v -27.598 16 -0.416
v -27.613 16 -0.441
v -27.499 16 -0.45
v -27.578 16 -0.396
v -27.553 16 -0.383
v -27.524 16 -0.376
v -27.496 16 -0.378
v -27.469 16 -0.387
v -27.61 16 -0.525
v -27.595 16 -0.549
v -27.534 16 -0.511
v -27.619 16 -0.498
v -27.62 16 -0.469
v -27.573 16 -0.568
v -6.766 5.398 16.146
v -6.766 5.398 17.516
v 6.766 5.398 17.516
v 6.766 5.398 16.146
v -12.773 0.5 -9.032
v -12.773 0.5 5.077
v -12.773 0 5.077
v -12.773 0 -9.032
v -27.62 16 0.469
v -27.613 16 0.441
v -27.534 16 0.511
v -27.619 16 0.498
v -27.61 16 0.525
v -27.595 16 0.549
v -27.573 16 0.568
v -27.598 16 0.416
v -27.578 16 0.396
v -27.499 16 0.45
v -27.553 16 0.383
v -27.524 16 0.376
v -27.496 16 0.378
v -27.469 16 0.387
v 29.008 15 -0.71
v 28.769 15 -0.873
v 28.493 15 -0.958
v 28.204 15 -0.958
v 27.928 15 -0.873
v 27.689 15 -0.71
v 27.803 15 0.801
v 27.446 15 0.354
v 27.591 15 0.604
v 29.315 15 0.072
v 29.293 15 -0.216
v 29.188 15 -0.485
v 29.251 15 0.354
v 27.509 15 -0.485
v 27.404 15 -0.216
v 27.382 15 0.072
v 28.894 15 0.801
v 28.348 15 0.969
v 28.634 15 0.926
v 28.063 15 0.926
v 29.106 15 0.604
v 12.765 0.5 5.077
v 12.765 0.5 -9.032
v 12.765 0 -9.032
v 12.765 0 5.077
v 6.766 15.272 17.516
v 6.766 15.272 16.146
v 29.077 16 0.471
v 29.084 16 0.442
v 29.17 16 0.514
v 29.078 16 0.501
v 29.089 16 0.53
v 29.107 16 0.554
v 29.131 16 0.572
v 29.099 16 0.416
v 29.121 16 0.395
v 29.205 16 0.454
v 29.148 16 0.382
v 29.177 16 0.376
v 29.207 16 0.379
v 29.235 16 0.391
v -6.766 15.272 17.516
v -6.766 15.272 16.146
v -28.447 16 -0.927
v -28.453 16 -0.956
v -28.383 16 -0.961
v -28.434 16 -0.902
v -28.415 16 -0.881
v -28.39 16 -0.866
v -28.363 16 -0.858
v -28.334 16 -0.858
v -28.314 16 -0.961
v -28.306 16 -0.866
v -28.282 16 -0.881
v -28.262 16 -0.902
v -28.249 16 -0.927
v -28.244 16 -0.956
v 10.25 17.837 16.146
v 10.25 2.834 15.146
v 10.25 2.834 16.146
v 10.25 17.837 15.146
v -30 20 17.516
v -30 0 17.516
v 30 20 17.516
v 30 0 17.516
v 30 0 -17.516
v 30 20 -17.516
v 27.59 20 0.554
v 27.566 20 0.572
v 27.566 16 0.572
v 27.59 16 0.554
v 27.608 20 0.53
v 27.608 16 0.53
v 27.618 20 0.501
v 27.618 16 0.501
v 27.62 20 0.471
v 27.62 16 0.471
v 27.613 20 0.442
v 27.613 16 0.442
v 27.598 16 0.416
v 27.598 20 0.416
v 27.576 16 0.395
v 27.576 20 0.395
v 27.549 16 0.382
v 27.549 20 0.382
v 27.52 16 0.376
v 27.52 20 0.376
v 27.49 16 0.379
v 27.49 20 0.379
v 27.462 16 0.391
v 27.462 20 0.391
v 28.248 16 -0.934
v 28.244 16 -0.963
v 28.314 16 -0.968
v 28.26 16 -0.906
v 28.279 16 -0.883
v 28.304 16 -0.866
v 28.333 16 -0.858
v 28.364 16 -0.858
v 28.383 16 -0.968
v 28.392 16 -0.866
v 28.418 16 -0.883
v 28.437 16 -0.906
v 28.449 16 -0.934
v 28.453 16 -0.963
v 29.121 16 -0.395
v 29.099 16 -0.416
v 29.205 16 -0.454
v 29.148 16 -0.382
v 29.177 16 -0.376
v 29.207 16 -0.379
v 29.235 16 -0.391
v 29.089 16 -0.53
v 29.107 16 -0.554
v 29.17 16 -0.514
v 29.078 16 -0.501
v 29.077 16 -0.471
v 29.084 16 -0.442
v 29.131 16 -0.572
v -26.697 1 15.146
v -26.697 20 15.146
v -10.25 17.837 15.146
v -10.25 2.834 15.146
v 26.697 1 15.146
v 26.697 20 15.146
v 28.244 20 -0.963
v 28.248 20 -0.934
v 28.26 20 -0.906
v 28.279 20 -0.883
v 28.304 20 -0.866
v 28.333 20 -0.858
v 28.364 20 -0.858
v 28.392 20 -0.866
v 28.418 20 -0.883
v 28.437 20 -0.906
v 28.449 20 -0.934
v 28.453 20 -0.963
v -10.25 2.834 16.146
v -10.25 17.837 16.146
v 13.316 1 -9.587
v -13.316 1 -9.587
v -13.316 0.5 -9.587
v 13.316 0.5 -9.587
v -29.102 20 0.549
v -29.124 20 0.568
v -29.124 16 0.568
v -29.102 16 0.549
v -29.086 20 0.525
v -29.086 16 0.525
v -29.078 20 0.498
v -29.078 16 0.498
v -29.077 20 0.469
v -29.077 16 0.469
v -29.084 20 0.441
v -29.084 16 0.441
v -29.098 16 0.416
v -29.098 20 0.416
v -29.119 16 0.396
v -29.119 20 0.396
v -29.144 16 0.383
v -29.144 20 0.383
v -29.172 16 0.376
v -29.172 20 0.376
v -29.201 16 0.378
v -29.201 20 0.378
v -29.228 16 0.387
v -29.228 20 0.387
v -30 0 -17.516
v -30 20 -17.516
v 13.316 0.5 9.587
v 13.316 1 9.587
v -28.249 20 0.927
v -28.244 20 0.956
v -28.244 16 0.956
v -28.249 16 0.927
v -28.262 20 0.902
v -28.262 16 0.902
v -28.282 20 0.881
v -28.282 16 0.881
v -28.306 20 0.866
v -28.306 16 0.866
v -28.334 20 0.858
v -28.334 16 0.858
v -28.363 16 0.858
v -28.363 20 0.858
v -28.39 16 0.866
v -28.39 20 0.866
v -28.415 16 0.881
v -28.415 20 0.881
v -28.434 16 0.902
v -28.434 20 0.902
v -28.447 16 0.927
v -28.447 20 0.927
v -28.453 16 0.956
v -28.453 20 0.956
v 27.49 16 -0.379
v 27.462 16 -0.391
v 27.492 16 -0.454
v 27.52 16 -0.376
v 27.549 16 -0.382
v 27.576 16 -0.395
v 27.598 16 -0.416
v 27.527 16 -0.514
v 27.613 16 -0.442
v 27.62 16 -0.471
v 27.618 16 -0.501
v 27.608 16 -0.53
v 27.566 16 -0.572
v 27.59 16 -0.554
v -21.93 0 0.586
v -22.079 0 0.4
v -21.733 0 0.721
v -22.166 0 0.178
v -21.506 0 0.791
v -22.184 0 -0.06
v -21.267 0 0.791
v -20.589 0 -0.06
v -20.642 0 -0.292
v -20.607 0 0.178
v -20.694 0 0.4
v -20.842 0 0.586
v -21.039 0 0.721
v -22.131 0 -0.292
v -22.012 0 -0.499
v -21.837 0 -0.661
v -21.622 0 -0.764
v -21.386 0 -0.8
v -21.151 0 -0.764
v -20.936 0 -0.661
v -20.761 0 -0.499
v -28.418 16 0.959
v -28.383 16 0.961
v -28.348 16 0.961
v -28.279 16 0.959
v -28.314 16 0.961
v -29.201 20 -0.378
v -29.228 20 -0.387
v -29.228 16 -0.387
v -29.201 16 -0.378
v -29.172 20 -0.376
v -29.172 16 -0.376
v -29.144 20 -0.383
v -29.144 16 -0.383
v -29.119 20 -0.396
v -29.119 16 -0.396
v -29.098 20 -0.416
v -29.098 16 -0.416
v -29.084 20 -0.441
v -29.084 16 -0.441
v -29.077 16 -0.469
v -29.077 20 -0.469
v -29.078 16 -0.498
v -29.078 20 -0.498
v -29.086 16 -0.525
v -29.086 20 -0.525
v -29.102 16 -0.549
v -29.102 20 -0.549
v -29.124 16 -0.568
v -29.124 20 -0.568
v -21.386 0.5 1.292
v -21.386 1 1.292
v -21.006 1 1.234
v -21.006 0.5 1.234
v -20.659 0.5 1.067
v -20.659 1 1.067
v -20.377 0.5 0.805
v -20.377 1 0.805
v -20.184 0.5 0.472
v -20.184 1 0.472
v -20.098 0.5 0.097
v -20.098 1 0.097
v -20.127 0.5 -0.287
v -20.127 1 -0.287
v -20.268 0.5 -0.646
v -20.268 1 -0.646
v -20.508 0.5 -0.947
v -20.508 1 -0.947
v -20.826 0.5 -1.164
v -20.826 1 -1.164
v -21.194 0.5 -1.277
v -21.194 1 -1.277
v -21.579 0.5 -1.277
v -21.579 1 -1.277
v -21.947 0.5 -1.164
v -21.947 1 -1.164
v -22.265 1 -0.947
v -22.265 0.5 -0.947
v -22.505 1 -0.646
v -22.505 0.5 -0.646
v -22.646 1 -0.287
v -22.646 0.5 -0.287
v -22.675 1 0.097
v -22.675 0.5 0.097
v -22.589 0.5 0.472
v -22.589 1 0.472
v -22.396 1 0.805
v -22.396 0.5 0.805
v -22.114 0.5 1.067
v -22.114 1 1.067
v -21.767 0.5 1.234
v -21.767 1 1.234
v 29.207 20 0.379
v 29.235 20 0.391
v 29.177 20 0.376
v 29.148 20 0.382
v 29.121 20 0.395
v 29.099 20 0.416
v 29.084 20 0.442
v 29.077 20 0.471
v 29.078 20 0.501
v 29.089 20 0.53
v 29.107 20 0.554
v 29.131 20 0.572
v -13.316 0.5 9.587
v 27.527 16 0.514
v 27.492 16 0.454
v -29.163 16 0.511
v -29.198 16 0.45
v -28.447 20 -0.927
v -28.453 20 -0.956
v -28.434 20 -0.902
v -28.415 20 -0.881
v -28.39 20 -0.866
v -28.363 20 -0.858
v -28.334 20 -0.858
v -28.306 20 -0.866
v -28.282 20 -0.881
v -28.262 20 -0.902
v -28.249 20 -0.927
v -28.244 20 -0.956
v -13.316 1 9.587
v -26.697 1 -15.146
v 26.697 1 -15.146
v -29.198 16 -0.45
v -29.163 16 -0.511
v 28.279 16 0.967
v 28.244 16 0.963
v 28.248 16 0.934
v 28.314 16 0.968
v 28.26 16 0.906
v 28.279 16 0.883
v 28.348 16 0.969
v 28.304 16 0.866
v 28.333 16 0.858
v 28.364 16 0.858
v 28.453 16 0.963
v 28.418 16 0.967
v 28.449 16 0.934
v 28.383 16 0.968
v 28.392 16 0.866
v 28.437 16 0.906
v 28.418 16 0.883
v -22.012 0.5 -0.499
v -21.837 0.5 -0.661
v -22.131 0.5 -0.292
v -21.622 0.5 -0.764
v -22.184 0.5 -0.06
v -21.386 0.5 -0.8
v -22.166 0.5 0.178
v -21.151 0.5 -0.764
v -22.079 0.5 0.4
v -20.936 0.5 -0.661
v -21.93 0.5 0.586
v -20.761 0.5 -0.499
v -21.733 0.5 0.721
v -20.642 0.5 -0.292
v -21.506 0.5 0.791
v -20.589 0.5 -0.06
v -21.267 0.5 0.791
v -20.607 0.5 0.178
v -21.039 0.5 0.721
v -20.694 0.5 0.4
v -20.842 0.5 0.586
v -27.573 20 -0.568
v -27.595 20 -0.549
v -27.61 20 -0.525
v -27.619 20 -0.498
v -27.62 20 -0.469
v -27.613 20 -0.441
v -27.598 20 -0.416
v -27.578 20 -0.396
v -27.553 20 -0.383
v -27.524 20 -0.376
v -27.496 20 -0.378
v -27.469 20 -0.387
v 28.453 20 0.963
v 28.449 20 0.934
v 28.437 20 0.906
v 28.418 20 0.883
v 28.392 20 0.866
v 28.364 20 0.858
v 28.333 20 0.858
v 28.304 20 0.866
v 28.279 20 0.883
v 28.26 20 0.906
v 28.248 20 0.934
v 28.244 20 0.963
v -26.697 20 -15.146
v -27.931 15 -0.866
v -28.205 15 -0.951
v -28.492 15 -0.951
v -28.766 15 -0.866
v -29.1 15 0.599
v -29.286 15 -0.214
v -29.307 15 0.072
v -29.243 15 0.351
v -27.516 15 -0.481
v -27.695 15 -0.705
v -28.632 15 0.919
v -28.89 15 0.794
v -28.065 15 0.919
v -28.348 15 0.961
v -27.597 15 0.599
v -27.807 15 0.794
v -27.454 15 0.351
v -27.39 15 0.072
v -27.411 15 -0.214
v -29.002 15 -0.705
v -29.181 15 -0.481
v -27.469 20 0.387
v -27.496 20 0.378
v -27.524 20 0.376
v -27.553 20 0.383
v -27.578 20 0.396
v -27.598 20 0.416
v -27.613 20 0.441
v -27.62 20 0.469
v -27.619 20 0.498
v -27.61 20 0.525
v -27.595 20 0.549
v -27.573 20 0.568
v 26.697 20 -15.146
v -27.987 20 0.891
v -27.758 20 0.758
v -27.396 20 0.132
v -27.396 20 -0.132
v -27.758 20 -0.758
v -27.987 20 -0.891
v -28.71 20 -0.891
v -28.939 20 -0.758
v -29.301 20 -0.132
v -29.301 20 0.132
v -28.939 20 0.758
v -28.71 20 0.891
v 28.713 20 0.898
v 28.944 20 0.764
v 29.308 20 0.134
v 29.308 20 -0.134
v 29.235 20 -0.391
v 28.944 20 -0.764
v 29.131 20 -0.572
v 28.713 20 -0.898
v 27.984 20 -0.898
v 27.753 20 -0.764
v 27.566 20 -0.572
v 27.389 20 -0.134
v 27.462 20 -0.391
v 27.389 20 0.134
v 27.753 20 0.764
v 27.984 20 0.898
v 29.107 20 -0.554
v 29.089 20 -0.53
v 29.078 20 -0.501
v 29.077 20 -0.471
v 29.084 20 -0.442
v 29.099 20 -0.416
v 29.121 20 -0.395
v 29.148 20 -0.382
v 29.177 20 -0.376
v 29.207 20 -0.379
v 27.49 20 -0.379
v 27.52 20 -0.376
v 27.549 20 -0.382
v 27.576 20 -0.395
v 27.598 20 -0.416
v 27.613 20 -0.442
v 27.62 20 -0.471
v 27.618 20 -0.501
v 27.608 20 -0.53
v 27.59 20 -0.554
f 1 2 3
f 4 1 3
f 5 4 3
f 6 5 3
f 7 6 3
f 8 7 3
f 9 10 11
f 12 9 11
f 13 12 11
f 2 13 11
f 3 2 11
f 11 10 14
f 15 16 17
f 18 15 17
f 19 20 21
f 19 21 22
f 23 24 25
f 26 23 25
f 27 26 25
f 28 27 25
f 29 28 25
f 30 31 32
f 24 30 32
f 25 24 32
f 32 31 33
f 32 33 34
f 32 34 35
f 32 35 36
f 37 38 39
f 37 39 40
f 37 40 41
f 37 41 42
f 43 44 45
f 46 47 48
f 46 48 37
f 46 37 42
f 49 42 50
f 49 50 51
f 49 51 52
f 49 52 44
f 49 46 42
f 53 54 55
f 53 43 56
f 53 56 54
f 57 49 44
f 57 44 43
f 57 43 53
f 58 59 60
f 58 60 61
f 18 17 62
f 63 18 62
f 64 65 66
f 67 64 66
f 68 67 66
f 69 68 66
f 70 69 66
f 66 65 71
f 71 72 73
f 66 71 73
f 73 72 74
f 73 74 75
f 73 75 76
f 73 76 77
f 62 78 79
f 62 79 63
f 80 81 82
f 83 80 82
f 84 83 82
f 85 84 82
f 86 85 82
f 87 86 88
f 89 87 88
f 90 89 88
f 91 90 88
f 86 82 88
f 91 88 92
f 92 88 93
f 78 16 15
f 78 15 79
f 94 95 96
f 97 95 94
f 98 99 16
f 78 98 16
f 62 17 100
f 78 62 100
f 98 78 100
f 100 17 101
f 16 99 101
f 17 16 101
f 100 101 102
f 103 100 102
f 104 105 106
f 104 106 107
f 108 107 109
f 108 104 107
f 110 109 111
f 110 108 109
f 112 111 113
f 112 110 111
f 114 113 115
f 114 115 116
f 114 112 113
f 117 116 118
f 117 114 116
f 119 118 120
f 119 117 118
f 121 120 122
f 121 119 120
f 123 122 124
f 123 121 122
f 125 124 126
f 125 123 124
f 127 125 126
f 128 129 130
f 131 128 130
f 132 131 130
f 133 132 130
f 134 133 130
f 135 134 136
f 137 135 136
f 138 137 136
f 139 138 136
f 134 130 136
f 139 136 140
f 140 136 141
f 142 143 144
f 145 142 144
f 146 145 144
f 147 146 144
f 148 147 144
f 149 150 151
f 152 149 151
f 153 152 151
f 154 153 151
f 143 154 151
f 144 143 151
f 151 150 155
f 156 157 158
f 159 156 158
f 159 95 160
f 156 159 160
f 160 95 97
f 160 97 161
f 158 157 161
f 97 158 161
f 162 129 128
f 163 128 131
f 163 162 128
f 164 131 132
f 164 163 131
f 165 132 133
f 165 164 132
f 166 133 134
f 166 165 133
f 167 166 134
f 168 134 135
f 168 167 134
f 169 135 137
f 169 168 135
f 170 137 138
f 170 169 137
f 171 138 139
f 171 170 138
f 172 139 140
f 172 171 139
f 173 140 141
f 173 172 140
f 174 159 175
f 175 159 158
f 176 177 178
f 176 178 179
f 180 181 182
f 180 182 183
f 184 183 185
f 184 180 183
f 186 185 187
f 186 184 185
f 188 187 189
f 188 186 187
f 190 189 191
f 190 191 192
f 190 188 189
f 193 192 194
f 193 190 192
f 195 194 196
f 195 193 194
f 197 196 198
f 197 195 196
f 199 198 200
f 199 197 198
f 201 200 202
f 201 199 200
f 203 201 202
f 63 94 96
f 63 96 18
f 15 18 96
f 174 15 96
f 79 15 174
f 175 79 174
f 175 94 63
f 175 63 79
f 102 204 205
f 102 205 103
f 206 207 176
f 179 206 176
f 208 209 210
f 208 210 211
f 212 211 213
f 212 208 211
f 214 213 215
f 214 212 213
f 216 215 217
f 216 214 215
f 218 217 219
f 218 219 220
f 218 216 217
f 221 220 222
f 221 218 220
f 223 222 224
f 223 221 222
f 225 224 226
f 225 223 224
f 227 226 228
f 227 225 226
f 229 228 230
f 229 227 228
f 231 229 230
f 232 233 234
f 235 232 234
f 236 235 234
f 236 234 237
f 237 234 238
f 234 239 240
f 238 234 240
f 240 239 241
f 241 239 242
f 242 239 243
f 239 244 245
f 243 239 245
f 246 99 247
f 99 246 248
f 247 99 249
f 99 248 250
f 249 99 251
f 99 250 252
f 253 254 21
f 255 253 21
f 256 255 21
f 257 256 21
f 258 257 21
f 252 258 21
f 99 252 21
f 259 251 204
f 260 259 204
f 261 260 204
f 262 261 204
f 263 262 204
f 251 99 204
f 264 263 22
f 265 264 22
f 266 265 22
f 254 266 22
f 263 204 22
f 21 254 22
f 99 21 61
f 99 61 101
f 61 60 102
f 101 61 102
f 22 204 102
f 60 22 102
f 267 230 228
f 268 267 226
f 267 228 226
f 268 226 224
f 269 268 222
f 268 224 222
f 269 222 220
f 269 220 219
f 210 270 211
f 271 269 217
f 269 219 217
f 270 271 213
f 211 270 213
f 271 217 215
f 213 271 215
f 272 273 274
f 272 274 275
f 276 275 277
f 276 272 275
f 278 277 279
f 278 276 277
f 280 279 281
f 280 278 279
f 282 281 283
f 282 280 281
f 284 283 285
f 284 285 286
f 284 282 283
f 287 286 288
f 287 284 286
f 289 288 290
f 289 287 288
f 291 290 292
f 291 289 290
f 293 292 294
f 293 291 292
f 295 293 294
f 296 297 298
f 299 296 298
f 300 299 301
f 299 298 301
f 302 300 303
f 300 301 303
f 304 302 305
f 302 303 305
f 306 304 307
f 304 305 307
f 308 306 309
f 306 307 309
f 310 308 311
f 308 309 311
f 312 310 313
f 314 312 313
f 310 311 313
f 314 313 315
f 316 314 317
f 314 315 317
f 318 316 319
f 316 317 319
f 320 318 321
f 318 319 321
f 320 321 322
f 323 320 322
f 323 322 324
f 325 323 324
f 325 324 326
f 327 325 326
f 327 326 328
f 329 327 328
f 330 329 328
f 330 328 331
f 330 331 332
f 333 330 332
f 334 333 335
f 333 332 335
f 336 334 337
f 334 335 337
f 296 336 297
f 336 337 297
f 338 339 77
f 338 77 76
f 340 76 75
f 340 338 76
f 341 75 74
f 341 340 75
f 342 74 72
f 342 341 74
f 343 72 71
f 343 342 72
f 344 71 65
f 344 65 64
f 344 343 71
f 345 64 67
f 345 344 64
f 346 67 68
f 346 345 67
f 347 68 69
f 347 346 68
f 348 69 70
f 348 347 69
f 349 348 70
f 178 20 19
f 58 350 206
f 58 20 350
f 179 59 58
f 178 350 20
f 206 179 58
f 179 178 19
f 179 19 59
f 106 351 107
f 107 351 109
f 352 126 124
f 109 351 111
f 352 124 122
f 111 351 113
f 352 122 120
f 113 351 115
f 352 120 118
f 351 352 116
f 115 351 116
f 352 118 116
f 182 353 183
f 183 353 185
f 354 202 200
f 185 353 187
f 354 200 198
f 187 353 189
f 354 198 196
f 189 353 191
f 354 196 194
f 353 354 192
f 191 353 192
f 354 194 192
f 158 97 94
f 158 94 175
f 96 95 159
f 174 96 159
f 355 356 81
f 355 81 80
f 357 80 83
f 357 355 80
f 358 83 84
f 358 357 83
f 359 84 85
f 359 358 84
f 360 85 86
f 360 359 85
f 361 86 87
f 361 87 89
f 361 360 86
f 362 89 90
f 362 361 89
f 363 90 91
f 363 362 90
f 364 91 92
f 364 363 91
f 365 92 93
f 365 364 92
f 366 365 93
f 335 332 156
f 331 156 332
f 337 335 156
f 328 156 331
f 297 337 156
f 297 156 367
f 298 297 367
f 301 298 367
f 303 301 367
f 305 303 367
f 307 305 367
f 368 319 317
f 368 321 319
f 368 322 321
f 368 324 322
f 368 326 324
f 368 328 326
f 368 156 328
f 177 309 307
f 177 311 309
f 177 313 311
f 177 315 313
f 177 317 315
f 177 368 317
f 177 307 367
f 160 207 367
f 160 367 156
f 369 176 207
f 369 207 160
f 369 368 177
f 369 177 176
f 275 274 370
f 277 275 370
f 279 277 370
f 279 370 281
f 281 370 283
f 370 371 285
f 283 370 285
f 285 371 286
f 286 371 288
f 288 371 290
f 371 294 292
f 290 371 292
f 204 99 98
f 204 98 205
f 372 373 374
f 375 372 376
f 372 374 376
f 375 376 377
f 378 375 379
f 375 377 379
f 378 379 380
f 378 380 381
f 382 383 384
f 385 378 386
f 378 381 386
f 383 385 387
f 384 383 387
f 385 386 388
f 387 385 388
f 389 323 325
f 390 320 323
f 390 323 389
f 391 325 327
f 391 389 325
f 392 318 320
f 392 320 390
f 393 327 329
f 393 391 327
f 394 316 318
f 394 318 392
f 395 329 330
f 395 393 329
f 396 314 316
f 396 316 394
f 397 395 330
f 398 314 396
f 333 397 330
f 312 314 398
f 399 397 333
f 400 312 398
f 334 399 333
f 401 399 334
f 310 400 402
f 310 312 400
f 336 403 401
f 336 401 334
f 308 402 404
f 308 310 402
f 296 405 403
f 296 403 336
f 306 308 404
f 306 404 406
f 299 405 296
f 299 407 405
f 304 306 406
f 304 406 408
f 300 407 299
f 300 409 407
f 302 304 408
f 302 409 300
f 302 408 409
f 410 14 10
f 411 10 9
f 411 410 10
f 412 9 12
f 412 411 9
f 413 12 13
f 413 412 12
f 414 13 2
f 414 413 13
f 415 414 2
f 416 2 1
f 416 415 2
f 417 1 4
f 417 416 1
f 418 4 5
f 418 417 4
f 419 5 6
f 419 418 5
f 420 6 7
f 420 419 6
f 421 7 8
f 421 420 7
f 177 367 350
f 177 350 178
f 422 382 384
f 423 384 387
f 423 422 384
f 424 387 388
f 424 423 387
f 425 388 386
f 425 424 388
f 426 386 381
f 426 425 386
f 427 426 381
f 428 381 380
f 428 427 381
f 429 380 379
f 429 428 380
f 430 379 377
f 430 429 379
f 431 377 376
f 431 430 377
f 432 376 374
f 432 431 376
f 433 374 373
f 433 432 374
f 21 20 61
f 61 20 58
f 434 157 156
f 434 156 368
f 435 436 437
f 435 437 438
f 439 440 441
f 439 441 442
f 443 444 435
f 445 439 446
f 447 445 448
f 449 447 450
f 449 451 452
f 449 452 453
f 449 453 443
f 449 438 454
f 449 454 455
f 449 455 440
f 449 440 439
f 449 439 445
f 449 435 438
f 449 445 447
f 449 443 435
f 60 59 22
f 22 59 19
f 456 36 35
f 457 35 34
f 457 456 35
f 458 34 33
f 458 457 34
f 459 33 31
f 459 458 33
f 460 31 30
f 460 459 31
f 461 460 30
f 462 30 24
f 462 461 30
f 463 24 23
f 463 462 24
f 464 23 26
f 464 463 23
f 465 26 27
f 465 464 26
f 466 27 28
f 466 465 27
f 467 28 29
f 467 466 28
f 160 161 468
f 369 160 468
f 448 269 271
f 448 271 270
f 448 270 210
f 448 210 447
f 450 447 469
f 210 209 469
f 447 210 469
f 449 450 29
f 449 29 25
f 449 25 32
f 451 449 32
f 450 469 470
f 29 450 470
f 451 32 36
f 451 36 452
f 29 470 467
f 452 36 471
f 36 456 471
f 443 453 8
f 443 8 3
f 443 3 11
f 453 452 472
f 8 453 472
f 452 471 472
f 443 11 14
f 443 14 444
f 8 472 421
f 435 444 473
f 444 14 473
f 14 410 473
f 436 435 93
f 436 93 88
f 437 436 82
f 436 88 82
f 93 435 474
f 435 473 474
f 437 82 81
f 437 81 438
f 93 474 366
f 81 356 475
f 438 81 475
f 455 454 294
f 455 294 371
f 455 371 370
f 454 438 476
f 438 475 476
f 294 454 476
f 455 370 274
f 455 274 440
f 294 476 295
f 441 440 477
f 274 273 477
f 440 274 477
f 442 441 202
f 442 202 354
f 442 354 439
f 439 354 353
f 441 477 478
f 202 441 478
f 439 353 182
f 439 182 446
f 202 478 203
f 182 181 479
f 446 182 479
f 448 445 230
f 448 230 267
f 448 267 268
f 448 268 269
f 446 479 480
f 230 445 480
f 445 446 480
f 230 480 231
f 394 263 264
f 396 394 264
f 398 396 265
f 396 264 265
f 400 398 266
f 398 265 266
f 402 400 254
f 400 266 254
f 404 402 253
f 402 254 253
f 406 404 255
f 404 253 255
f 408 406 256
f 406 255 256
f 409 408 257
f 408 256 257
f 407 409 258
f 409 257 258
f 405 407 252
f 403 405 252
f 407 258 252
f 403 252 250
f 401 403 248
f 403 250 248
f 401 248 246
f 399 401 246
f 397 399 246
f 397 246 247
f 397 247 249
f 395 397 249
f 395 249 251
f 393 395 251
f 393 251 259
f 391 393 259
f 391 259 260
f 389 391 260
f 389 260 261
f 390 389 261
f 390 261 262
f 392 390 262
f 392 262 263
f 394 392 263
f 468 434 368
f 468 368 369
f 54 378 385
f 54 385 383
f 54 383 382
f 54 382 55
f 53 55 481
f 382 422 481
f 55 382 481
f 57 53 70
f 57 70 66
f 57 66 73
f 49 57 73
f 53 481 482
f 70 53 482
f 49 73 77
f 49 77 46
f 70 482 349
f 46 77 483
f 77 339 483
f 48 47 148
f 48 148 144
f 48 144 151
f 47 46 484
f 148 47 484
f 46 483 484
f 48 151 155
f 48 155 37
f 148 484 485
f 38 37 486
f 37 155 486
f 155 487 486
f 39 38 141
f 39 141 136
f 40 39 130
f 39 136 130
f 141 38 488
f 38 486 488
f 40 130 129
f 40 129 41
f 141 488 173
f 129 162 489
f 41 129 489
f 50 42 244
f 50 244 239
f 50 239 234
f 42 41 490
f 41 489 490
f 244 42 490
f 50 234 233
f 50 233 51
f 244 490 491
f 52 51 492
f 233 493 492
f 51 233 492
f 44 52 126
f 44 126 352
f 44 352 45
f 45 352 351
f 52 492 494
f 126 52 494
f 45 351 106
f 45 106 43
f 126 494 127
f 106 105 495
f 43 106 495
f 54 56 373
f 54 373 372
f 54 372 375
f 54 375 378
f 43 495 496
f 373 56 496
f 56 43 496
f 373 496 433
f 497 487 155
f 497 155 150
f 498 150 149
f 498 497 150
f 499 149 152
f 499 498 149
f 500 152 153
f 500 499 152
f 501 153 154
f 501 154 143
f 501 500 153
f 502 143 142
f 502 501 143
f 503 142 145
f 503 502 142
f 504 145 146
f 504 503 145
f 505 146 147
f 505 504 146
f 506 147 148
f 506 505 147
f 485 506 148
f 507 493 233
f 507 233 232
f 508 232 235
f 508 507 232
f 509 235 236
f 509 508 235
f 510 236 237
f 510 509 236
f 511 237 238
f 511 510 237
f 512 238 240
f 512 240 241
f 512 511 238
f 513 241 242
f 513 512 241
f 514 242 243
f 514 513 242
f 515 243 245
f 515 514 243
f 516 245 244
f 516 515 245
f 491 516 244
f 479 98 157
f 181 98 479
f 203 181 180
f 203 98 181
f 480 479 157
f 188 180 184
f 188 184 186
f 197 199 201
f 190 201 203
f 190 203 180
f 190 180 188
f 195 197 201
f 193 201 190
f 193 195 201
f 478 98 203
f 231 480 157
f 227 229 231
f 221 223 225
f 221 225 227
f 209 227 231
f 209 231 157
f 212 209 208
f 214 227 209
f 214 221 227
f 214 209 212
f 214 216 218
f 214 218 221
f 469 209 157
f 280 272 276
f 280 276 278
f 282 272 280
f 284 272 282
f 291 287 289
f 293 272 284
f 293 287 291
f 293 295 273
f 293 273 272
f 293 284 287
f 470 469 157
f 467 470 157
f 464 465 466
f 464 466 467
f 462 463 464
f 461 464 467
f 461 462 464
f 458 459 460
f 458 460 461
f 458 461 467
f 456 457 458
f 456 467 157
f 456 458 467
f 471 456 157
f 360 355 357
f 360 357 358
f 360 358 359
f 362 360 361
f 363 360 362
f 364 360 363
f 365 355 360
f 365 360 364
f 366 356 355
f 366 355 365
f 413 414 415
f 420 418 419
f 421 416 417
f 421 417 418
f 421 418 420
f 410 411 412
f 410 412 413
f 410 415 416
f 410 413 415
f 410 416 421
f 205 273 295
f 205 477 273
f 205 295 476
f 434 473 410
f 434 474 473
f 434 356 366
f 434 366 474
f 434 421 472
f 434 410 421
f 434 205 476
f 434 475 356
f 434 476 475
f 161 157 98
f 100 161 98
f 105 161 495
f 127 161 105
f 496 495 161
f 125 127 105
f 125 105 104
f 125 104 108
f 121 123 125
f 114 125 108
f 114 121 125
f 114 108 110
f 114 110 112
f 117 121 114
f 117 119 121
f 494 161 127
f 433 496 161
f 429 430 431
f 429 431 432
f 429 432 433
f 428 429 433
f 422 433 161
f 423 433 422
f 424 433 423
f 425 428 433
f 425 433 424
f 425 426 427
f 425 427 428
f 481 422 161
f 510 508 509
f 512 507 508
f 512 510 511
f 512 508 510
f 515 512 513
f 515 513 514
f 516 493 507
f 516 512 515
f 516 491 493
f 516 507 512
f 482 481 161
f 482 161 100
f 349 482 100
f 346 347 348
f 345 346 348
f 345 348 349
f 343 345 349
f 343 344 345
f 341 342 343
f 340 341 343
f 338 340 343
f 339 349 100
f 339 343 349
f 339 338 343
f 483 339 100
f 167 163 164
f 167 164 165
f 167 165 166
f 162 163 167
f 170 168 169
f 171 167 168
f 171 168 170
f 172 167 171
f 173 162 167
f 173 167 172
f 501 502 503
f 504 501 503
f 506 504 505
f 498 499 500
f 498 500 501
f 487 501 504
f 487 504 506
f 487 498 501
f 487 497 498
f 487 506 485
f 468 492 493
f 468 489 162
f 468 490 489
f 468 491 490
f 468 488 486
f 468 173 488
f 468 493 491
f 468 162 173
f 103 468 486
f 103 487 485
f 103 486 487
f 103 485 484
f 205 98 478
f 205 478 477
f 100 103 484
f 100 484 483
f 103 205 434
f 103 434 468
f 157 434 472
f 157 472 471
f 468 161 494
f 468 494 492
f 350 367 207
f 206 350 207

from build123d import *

# Parameters (mm, degrees)
SKETCH1_W           = 60.000499048
SKETCH1_H           = 35.031496816
BOSS_EXTRUDE1_DEPTH = 20
SKETCH2_W           = 53.393284908
SKETCH2_H           = 30.292765524
CUT_EXTRUDE1_DEPTH  = 19
SKETCH3_W           = 26.632310578
SKETCH3_H           = 19.17374817
CUT_EXTRUDE2_DEPTH  = 0.5
CUT_EXTRUDE3_DEPTH  = 0.5
SKETCH7_R           = 0.969129223
SKETCH7_R_2         = 0.961352825
CUT_EXTRUDE6_DEPTH  = 5
SKETCH8_R           = 0.104594239
BOSS_EXTRUDE2_DEPTH = 4
SKETCH9_R           = 0.799775616
CUT_EXTRUDE7_DEPTH  = 6
SKETCH10_R          = 1.291760959
CUT_EXTRUDE8_DEPTH  = 0.5
SKETCH13_W          = 13.531174942
SKETCH13_H          = 9.874100633
CUT_EXTRUDE11_DEPTH = 10
SKETCH14_W          = 20.49935166
SKETCH14_H          = 15.002696216
CUT_EXTRUDE12_DEPTH = 1


with BuildPart() as part:
    # Sketch1 → Boss-Extrude1 (new body)
    with BuildSketch(Plane(origin=(0, 0, 0), x_dir=(1, 0, 0), z_dir=(0, 1, 0))):
        Rectangle(SKETCH1_W, SKETCH1_H)
    extrude(amount=BOSS_EXTRUDE1_DEPTH)

    # Sketch2 → Cut-Extrude1 (cut)
    with BuildSketch(Plane(origin=(0, 20, 0), x_dir=(1, 0, 0), z_dir=(0, 1, 0))):
        Rectangle(SKETCH2_W, SKETCH2_H)
    extrude(amount=-CUT_EXTRUDE1_DEPTH, mode=Mode.SUBTRACT)

    # Sketch3 → Cut-Extrude2 (cut)
    with BuildSketch(Plane(origin=(0, 1, 0), x_dir=(1, 0, 0), z_dir=(0, 1, 0))):
        Rectangle(SKETCH3_W, SKETCH3_H)
    extrude(amount=-CUT_EXTRUDE2_DEPTH, mode=Mode.SUBTRACT)

    # Sketch4 → Cut-Extrude3 (cut)
    with BuildSketch(Plane(origin=(0, 0.5, 0), x_dir=(1, 0, 0), z_dir=(0, 1, 0))):
        Polygon((0, -5.07722156), (-12.772700857, -5.07722156), (-12.772700857, 9.032439271), (0, 9.032439271), (12.765065903, 9.032439271), (12.765065903, -5.07722156), align=None)
    extrude(amount=-CUT_EXTRUDE3_DEPTH, mode=Mode.SUBTRACT)

    # Sketch7 → Cut-Extrude6 (cut)
    with BuildSketch(Plane(origin=(0, 20, 0), x_dir=(1, 0, 0), z_dir=(0, 1, 0))):
        with Locations(Location((28.348445989, 0, 0), (0, 0, 270))):
            Circle(SKETCH7_R)
        with Locations(Location((-28.348445989, 0, 0), (0, 0, 270))):
            Circle(SKETCH7_R_2)
    extrude(amount=-CUT_EXTRUDE6_DEPTH, mode=Mode.SUBTRACT)

    # Sketch8 → Boss-Extrude2 (add)
    with BuildSketch(Plane(origin=(0, 20, 0), x_dir=(1, 0, 0), z_dir=(0, 1, 0))):
        with Locations((-28.348445989, 0.961352825)):
            Circle(SKETCH8_R)
        with Locations((-27.51589002, 0.480676413)):
            Circle(SKETCH8_R)
        with Locations((-27.51589002, -0.480676413)):
            Circle(SKETCH8_R)
        with Locations((-28.348445989, -0.961352825)):
            Circle(SKETCH8_R)
        with Locations((-29.181001958, -0.480676413)):
            Circle(SKETCH8_R)
        with Locations((-29.181001958, 0.480676413)):
            Circle(SKETCH8_R)
        with Locations((27.51589002, 0.480676413)):
            Circle(SKETCH8_R)
        with Locations((27.51589002, -0.480676413)):
            Circle(SKETCH8_R)
        with Locations((28.348445989, -0.961352825)):
            Circle(SKETCH8_R)
        with Locations((29.181001958, -0.480676413)):
            Circle(SKETCH8_R)
        with Locations((29.181001958, 0.480676413)):
            Circle(SKETCH8_R)
        with Locations((28.348445989, 0.961352825)):
            Circle(SKETCH8_R)
    extrude(amount=-BOSS_EXTRUDE2_DEPTH)

    # Sketch9 → Cut-Extrude7 (cut)
    with BuildSketch(Plane.XZ):
        with Locations(Location((-21.38647519, 0, 0), (0, 0, 270))):
            Circle(SKETCH9_R)
    extrude(amount=-CUT_EXTRUDE7_DEPTH, mode=Mode.SUBTRACT)

    # Sketch10 → Cut-Extrude8 (cut)
    with BuildSketch(Plane(origin=(0, 1, 0), x_dir=(1, 0, 0), z_dir=(0, 1, 0))):
        with Locations(Location((-21.38647519, 0, 0), (0, 0, 270))):
            Circle(SKETCH10_R)
    extrude(amount=-CUT_EXTRUDE8_DEPTH, mode=Mode.SUBTRACT)

    # Sketch13 → Cut-Extrude11 (cut)
    with BuildSketch(Plane.XY.offset(17.515748408)):
        with Locations((0, 10.335231811)):
            Rectangle(SKETCH13_W, SKETCH13_H)
    extrude(amount=-CUT_EXTRUDE11_DEPTH, mode=Mode.SUBTRACT)

    # Sketch14 → Cut-Extrude12 (cut)
    with BuildSketch(Plane(origin=(0, 0, 15.146382762), x_dir=(-1, 0, 0), z_dir=(0, 0, -1))):
        with Locations((0, 10.335231812)):
            Rectangle(SKETCH14_W, SKETCH14_H)
    extrude(amount=-CUT_EXTRUDE12_DEPTH, mode=Mode.SUBTRACT)


solid = part.part
